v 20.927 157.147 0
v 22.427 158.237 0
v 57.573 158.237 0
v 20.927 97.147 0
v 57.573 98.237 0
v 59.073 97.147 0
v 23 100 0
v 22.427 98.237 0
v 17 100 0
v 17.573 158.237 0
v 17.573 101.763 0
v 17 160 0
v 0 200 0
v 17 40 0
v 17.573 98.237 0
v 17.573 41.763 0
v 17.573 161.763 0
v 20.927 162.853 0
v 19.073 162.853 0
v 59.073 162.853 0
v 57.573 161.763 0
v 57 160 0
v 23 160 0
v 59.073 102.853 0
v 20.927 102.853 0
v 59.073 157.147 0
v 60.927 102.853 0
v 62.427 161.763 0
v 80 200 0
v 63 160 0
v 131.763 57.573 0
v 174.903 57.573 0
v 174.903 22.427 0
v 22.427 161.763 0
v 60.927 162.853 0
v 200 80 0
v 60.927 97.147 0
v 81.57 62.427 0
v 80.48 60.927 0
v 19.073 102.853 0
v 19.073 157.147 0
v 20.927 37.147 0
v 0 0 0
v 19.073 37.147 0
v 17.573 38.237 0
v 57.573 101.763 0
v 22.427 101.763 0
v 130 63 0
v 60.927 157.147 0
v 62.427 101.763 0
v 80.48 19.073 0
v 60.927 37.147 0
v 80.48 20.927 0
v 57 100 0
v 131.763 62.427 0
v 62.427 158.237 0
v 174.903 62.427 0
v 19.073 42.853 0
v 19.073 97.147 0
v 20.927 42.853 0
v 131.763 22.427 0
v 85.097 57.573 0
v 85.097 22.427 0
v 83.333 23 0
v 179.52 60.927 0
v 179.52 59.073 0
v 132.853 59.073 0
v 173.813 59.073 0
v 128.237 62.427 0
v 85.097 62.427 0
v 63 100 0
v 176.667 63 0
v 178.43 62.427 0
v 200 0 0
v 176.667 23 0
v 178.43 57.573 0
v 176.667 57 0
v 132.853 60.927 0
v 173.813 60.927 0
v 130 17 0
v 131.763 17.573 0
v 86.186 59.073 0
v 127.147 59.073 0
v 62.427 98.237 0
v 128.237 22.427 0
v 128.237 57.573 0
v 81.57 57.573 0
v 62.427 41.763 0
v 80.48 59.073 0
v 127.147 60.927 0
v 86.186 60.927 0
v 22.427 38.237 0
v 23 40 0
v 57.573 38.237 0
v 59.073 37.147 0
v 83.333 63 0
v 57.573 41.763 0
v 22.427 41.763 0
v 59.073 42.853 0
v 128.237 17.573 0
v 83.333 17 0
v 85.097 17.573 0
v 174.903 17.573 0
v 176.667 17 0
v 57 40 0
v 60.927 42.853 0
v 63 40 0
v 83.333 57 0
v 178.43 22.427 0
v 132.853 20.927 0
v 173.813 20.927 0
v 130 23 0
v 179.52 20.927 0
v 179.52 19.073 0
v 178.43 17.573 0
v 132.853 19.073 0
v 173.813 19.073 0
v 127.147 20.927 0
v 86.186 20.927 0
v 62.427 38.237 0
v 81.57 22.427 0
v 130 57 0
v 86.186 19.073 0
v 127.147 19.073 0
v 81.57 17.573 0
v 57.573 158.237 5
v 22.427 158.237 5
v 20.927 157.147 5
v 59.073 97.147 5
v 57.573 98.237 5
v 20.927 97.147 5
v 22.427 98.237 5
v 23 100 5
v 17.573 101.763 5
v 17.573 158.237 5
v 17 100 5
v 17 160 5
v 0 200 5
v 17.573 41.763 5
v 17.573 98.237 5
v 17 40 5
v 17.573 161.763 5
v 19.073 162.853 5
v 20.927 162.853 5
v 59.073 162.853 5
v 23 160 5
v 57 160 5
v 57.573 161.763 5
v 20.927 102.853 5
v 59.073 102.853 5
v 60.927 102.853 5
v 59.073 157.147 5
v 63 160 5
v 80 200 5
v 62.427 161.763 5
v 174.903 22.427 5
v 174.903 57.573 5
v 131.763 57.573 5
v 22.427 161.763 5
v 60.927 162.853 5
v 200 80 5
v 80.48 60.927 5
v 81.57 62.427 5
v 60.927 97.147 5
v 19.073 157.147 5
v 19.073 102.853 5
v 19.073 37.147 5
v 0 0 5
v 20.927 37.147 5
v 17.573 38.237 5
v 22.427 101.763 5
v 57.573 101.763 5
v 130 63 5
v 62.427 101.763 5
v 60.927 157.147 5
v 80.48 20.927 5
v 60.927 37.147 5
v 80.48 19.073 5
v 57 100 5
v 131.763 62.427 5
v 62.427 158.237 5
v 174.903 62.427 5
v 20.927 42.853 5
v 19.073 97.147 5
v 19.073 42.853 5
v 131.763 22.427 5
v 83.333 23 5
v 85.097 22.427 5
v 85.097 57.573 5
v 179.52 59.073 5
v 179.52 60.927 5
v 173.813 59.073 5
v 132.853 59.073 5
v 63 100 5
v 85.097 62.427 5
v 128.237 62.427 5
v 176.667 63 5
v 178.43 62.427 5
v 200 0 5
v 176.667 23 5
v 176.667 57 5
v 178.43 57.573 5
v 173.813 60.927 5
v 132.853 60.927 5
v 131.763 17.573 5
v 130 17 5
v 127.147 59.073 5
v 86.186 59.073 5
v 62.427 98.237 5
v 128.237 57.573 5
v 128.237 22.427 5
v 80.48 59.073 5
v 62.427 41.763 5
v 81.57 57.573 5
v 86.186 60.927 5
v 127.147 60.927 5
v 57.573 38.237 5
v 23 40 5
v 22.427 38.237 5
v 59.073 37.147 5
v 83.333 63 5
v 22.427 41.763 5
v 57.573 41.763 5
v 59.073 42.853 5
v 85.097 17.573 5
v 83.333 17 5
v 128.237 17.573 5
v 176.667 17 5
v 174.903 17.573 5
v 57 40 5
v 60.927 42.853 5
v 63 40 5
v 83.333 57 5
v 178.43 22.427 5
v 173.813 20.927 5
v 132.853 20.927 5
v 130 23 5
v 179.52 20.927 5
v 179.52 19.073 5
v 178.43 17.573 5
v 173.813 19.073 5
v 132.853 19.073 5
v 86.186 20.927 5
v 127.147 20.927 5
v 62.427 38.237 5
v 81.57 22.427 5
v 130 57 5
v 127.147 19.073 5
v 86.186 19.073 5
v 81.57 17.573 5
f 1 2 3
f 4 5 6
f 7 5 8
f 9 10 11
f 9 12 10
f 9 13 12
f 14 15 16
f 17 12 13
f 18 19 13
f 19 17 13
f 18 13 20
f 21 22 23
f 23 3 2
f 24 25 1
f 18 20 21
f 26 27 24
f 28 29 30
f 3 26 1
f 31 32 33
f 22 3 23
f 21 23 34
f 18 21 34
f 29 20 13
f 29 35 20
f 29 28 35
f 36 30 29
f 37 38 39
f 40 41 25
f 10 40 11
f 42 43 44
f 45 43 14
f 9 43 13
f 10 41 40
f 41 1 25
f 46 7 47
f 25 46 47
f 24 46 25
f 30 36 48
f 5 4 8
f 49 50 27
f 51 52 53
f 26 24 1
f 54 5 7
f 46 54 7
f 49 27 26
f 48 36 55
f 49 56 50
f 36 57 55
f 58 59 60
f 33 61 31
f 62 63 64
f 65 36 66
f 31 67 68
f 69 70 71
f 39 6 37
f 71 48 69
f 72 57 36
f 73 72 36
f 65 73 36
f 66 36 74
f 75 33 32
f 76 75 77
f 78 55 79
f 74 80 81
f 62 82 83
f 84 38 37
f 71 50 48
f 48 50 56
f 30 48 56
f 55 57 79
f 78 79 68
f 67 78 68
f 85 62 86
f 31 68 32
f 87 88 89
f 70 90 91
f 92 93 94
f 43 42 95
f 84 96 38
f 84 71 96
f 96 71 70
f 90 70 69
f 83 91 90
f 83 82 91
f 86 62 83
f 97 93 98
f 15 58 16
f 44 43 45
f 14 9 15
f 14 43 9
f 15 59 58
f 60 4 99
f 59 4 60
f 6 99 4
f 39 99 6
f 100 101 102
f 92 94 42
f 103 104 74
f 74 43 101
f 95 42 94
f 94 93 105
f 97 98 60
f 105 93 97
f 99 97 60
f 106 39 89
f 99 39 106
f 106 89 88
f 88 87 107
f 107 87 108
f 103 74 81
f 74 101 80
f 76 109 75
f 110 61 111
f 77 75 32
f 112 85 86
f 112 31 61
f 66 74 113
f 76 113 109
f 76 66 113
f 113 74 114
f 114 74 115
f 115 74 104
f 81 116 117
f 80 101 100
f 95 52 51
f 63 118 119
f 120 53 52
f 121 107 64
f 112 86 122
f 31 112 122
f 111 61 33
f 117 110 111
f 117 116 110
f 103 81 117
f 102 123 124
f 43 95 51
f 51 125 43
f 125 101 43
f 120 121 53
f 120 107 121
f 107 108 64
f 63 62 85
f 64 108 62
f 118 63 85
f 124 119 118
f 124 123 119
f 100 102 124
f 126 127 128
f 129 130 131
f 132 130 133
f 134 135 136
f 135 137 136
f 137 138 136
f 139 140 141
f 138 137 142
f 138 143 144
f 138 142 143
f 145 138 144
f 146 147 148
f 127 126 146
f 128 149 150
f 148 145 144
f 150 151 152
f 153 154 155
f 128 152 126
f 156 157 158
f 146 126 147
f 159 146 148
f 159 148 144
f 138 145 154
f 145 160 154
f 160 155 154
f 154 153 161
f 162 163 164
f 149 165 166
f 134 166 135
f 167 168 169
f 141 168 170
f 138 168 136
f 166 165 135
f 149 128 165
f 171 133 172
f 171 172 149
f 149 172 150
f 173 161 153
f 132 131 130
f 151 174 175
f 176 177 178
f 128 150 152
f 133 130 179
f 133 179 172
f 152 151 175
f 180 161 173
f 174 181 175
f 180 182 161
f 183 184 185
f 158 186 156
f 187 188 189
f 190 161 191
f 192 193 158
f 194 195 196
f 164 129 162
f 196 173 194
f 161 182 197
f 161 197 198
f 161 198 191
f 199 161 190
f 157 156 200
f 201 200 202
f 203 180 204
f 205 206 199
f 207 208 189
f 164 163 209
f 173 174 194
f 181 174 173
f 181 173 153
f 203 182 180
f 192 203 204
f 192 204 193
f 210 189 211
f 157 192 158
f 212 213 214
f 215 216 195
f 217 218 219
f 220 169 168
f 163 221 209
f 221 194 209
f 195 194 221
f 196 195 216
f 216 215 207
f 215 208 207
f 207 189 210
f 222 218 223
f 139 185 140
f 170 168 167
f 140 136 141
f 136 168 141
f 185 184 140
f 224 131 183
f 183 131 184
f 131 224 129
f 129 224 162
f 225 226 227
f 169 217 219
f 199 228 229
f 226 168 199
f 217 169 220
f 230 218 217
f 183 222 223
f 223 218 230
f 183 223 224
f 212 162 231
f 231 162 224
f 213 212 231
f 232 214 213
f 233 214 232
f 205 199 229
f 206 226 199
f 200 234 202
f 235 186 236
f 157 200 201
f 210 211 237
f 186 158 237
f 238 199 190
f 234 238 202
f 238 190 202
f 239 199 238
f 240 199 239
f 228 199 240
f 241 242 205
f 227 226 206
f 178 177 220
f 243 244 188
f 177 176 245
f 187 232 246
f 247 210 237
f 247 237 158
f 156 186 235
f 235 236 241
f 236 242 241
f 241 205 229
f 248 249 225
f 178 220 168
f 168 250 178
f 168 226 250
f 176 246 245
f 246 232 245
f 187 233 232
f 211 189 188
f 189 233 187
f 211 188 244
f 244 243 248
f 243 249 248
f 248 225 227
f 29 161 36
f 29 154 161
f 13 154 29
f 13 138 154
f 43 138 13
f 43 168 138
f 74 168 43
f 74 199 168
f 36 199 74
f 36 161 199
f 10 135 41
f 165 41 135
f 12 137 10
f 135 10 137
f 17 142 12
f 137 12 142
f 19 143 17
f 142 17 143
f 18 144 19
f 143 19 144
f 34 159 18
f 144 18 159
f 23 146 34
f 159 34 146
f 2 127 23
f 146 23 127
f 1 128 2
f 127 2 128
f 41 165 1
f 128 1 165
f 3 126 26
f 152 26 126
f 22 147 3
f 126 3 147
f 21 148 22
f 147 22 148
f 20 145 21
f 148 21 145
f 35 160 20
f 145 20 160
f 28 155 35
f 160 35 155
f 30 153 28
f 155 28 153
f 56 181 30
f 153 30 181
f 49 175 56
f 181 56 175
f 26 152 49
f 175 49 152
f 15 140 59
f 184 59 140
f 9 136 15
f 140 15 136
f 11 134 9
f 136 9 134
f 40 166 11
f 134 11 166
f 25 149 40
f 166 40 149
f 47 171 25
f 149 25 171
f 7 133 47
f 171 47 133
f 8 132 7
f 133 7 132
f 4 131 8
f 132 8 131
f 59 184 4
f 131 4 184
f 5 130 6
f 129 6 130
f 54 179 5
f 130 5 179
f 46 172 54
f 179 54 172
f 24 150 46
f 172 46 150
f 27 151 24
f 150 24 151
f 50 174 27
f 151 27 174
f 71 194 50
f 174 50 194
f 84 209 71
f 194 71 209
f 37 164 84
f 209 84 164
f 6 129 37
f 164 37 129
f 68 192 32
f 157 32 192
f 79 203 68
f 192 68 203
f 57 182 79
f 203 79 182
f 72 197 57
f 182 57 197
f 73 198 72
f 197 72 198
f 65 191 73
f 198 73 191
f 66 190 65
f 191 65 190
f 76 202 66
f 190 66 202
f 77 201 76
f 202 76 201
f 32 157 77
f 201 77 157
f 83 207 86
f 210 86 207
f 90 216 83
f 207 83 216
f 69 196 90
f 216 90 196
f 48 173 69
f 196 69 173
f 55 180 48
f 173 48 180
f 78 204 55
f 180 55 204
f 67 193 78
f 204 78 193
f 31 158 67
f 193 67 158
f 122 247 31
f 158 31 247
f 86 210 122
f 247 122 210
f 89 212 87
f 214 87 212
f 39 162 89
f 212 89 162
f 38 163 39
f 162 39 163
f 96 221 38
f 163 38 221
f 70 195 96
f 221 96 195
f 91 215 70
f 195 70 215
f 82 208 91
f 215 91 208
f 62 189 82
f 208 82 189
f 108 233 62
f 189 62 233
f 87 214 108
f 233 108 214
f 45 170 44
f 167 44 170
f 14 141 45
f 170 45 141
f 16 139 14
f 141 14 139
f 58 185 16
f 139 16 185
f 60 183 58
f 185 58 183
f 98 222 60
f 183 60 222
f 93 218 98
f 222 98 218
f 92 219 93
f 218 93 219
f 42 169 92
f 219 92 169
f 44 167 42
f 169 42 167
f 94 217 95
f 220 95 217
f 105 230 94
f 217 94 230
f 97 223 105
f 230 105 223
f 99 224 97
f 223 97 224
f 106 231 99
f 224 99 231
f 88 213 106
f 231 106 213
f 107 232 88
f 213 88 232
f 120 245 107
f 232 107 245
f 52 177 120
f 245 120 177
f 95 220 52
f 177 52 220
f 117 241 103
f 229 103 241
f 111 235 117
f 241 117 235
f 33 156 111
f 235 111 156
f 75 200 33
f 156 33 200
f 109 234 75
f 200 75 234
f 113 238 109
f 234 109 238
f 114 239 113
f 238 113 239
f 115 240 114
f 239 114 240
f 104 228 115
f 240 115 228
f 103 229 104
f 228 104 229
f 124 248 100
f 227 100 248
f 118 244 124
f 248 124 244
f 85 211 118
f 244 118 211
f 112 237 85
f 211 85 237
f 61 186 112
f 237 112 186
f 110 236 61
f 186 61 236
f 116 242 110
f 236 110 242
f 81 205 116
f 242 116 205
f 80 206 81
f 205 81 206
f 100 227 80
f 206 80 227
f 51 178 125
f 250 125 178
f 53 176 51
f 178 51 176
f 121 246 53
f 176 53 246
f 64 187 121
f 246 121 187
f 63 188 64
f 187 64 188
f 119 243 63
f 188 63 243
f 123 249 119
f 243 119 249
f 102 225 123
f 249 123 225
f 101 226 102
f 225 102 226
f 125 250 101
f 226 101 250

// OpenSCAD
// file: bracket.scad
module bracket(h, l, a, b) {
	linear_extrude(h) {
		difference() {
			polygon([[0,0], [l, 0], [l, a], [b, l], [0, l]]);
			children(0);
			rotate([0, 180, -90]) children(1);
		}
	}
}

module bracket_holes(width, length, offset_, diameter, holes, rows=1) {
	between_rows = (width)/(rows);
	between_holes = (length - offset_*2)/(holes);
	wcenter = (width-((rows-1)*between_rows))/2;
	lcenter = (length-((holes-1)*between_holes))/2;
	for (r = [0:rows-1]) {
		row = wcenter + r*between_rows;
		for (i = [0:holes-1]) {
			translate([row, lcenter + i*between_holes]) circle(r=diameter/2);
		}
	}
}
// main file
use <bracket.scad>;

module bracket_8080(h=5) {
	bracket(h, 200, 80, 80) {
		bracket_holes(80, 200, 10, 6, 3, 2);
		translate([0, 30, 0]) bracket_holes(80, 200, 30, 6, 3, 2);
	}
}
bracket_8080();
